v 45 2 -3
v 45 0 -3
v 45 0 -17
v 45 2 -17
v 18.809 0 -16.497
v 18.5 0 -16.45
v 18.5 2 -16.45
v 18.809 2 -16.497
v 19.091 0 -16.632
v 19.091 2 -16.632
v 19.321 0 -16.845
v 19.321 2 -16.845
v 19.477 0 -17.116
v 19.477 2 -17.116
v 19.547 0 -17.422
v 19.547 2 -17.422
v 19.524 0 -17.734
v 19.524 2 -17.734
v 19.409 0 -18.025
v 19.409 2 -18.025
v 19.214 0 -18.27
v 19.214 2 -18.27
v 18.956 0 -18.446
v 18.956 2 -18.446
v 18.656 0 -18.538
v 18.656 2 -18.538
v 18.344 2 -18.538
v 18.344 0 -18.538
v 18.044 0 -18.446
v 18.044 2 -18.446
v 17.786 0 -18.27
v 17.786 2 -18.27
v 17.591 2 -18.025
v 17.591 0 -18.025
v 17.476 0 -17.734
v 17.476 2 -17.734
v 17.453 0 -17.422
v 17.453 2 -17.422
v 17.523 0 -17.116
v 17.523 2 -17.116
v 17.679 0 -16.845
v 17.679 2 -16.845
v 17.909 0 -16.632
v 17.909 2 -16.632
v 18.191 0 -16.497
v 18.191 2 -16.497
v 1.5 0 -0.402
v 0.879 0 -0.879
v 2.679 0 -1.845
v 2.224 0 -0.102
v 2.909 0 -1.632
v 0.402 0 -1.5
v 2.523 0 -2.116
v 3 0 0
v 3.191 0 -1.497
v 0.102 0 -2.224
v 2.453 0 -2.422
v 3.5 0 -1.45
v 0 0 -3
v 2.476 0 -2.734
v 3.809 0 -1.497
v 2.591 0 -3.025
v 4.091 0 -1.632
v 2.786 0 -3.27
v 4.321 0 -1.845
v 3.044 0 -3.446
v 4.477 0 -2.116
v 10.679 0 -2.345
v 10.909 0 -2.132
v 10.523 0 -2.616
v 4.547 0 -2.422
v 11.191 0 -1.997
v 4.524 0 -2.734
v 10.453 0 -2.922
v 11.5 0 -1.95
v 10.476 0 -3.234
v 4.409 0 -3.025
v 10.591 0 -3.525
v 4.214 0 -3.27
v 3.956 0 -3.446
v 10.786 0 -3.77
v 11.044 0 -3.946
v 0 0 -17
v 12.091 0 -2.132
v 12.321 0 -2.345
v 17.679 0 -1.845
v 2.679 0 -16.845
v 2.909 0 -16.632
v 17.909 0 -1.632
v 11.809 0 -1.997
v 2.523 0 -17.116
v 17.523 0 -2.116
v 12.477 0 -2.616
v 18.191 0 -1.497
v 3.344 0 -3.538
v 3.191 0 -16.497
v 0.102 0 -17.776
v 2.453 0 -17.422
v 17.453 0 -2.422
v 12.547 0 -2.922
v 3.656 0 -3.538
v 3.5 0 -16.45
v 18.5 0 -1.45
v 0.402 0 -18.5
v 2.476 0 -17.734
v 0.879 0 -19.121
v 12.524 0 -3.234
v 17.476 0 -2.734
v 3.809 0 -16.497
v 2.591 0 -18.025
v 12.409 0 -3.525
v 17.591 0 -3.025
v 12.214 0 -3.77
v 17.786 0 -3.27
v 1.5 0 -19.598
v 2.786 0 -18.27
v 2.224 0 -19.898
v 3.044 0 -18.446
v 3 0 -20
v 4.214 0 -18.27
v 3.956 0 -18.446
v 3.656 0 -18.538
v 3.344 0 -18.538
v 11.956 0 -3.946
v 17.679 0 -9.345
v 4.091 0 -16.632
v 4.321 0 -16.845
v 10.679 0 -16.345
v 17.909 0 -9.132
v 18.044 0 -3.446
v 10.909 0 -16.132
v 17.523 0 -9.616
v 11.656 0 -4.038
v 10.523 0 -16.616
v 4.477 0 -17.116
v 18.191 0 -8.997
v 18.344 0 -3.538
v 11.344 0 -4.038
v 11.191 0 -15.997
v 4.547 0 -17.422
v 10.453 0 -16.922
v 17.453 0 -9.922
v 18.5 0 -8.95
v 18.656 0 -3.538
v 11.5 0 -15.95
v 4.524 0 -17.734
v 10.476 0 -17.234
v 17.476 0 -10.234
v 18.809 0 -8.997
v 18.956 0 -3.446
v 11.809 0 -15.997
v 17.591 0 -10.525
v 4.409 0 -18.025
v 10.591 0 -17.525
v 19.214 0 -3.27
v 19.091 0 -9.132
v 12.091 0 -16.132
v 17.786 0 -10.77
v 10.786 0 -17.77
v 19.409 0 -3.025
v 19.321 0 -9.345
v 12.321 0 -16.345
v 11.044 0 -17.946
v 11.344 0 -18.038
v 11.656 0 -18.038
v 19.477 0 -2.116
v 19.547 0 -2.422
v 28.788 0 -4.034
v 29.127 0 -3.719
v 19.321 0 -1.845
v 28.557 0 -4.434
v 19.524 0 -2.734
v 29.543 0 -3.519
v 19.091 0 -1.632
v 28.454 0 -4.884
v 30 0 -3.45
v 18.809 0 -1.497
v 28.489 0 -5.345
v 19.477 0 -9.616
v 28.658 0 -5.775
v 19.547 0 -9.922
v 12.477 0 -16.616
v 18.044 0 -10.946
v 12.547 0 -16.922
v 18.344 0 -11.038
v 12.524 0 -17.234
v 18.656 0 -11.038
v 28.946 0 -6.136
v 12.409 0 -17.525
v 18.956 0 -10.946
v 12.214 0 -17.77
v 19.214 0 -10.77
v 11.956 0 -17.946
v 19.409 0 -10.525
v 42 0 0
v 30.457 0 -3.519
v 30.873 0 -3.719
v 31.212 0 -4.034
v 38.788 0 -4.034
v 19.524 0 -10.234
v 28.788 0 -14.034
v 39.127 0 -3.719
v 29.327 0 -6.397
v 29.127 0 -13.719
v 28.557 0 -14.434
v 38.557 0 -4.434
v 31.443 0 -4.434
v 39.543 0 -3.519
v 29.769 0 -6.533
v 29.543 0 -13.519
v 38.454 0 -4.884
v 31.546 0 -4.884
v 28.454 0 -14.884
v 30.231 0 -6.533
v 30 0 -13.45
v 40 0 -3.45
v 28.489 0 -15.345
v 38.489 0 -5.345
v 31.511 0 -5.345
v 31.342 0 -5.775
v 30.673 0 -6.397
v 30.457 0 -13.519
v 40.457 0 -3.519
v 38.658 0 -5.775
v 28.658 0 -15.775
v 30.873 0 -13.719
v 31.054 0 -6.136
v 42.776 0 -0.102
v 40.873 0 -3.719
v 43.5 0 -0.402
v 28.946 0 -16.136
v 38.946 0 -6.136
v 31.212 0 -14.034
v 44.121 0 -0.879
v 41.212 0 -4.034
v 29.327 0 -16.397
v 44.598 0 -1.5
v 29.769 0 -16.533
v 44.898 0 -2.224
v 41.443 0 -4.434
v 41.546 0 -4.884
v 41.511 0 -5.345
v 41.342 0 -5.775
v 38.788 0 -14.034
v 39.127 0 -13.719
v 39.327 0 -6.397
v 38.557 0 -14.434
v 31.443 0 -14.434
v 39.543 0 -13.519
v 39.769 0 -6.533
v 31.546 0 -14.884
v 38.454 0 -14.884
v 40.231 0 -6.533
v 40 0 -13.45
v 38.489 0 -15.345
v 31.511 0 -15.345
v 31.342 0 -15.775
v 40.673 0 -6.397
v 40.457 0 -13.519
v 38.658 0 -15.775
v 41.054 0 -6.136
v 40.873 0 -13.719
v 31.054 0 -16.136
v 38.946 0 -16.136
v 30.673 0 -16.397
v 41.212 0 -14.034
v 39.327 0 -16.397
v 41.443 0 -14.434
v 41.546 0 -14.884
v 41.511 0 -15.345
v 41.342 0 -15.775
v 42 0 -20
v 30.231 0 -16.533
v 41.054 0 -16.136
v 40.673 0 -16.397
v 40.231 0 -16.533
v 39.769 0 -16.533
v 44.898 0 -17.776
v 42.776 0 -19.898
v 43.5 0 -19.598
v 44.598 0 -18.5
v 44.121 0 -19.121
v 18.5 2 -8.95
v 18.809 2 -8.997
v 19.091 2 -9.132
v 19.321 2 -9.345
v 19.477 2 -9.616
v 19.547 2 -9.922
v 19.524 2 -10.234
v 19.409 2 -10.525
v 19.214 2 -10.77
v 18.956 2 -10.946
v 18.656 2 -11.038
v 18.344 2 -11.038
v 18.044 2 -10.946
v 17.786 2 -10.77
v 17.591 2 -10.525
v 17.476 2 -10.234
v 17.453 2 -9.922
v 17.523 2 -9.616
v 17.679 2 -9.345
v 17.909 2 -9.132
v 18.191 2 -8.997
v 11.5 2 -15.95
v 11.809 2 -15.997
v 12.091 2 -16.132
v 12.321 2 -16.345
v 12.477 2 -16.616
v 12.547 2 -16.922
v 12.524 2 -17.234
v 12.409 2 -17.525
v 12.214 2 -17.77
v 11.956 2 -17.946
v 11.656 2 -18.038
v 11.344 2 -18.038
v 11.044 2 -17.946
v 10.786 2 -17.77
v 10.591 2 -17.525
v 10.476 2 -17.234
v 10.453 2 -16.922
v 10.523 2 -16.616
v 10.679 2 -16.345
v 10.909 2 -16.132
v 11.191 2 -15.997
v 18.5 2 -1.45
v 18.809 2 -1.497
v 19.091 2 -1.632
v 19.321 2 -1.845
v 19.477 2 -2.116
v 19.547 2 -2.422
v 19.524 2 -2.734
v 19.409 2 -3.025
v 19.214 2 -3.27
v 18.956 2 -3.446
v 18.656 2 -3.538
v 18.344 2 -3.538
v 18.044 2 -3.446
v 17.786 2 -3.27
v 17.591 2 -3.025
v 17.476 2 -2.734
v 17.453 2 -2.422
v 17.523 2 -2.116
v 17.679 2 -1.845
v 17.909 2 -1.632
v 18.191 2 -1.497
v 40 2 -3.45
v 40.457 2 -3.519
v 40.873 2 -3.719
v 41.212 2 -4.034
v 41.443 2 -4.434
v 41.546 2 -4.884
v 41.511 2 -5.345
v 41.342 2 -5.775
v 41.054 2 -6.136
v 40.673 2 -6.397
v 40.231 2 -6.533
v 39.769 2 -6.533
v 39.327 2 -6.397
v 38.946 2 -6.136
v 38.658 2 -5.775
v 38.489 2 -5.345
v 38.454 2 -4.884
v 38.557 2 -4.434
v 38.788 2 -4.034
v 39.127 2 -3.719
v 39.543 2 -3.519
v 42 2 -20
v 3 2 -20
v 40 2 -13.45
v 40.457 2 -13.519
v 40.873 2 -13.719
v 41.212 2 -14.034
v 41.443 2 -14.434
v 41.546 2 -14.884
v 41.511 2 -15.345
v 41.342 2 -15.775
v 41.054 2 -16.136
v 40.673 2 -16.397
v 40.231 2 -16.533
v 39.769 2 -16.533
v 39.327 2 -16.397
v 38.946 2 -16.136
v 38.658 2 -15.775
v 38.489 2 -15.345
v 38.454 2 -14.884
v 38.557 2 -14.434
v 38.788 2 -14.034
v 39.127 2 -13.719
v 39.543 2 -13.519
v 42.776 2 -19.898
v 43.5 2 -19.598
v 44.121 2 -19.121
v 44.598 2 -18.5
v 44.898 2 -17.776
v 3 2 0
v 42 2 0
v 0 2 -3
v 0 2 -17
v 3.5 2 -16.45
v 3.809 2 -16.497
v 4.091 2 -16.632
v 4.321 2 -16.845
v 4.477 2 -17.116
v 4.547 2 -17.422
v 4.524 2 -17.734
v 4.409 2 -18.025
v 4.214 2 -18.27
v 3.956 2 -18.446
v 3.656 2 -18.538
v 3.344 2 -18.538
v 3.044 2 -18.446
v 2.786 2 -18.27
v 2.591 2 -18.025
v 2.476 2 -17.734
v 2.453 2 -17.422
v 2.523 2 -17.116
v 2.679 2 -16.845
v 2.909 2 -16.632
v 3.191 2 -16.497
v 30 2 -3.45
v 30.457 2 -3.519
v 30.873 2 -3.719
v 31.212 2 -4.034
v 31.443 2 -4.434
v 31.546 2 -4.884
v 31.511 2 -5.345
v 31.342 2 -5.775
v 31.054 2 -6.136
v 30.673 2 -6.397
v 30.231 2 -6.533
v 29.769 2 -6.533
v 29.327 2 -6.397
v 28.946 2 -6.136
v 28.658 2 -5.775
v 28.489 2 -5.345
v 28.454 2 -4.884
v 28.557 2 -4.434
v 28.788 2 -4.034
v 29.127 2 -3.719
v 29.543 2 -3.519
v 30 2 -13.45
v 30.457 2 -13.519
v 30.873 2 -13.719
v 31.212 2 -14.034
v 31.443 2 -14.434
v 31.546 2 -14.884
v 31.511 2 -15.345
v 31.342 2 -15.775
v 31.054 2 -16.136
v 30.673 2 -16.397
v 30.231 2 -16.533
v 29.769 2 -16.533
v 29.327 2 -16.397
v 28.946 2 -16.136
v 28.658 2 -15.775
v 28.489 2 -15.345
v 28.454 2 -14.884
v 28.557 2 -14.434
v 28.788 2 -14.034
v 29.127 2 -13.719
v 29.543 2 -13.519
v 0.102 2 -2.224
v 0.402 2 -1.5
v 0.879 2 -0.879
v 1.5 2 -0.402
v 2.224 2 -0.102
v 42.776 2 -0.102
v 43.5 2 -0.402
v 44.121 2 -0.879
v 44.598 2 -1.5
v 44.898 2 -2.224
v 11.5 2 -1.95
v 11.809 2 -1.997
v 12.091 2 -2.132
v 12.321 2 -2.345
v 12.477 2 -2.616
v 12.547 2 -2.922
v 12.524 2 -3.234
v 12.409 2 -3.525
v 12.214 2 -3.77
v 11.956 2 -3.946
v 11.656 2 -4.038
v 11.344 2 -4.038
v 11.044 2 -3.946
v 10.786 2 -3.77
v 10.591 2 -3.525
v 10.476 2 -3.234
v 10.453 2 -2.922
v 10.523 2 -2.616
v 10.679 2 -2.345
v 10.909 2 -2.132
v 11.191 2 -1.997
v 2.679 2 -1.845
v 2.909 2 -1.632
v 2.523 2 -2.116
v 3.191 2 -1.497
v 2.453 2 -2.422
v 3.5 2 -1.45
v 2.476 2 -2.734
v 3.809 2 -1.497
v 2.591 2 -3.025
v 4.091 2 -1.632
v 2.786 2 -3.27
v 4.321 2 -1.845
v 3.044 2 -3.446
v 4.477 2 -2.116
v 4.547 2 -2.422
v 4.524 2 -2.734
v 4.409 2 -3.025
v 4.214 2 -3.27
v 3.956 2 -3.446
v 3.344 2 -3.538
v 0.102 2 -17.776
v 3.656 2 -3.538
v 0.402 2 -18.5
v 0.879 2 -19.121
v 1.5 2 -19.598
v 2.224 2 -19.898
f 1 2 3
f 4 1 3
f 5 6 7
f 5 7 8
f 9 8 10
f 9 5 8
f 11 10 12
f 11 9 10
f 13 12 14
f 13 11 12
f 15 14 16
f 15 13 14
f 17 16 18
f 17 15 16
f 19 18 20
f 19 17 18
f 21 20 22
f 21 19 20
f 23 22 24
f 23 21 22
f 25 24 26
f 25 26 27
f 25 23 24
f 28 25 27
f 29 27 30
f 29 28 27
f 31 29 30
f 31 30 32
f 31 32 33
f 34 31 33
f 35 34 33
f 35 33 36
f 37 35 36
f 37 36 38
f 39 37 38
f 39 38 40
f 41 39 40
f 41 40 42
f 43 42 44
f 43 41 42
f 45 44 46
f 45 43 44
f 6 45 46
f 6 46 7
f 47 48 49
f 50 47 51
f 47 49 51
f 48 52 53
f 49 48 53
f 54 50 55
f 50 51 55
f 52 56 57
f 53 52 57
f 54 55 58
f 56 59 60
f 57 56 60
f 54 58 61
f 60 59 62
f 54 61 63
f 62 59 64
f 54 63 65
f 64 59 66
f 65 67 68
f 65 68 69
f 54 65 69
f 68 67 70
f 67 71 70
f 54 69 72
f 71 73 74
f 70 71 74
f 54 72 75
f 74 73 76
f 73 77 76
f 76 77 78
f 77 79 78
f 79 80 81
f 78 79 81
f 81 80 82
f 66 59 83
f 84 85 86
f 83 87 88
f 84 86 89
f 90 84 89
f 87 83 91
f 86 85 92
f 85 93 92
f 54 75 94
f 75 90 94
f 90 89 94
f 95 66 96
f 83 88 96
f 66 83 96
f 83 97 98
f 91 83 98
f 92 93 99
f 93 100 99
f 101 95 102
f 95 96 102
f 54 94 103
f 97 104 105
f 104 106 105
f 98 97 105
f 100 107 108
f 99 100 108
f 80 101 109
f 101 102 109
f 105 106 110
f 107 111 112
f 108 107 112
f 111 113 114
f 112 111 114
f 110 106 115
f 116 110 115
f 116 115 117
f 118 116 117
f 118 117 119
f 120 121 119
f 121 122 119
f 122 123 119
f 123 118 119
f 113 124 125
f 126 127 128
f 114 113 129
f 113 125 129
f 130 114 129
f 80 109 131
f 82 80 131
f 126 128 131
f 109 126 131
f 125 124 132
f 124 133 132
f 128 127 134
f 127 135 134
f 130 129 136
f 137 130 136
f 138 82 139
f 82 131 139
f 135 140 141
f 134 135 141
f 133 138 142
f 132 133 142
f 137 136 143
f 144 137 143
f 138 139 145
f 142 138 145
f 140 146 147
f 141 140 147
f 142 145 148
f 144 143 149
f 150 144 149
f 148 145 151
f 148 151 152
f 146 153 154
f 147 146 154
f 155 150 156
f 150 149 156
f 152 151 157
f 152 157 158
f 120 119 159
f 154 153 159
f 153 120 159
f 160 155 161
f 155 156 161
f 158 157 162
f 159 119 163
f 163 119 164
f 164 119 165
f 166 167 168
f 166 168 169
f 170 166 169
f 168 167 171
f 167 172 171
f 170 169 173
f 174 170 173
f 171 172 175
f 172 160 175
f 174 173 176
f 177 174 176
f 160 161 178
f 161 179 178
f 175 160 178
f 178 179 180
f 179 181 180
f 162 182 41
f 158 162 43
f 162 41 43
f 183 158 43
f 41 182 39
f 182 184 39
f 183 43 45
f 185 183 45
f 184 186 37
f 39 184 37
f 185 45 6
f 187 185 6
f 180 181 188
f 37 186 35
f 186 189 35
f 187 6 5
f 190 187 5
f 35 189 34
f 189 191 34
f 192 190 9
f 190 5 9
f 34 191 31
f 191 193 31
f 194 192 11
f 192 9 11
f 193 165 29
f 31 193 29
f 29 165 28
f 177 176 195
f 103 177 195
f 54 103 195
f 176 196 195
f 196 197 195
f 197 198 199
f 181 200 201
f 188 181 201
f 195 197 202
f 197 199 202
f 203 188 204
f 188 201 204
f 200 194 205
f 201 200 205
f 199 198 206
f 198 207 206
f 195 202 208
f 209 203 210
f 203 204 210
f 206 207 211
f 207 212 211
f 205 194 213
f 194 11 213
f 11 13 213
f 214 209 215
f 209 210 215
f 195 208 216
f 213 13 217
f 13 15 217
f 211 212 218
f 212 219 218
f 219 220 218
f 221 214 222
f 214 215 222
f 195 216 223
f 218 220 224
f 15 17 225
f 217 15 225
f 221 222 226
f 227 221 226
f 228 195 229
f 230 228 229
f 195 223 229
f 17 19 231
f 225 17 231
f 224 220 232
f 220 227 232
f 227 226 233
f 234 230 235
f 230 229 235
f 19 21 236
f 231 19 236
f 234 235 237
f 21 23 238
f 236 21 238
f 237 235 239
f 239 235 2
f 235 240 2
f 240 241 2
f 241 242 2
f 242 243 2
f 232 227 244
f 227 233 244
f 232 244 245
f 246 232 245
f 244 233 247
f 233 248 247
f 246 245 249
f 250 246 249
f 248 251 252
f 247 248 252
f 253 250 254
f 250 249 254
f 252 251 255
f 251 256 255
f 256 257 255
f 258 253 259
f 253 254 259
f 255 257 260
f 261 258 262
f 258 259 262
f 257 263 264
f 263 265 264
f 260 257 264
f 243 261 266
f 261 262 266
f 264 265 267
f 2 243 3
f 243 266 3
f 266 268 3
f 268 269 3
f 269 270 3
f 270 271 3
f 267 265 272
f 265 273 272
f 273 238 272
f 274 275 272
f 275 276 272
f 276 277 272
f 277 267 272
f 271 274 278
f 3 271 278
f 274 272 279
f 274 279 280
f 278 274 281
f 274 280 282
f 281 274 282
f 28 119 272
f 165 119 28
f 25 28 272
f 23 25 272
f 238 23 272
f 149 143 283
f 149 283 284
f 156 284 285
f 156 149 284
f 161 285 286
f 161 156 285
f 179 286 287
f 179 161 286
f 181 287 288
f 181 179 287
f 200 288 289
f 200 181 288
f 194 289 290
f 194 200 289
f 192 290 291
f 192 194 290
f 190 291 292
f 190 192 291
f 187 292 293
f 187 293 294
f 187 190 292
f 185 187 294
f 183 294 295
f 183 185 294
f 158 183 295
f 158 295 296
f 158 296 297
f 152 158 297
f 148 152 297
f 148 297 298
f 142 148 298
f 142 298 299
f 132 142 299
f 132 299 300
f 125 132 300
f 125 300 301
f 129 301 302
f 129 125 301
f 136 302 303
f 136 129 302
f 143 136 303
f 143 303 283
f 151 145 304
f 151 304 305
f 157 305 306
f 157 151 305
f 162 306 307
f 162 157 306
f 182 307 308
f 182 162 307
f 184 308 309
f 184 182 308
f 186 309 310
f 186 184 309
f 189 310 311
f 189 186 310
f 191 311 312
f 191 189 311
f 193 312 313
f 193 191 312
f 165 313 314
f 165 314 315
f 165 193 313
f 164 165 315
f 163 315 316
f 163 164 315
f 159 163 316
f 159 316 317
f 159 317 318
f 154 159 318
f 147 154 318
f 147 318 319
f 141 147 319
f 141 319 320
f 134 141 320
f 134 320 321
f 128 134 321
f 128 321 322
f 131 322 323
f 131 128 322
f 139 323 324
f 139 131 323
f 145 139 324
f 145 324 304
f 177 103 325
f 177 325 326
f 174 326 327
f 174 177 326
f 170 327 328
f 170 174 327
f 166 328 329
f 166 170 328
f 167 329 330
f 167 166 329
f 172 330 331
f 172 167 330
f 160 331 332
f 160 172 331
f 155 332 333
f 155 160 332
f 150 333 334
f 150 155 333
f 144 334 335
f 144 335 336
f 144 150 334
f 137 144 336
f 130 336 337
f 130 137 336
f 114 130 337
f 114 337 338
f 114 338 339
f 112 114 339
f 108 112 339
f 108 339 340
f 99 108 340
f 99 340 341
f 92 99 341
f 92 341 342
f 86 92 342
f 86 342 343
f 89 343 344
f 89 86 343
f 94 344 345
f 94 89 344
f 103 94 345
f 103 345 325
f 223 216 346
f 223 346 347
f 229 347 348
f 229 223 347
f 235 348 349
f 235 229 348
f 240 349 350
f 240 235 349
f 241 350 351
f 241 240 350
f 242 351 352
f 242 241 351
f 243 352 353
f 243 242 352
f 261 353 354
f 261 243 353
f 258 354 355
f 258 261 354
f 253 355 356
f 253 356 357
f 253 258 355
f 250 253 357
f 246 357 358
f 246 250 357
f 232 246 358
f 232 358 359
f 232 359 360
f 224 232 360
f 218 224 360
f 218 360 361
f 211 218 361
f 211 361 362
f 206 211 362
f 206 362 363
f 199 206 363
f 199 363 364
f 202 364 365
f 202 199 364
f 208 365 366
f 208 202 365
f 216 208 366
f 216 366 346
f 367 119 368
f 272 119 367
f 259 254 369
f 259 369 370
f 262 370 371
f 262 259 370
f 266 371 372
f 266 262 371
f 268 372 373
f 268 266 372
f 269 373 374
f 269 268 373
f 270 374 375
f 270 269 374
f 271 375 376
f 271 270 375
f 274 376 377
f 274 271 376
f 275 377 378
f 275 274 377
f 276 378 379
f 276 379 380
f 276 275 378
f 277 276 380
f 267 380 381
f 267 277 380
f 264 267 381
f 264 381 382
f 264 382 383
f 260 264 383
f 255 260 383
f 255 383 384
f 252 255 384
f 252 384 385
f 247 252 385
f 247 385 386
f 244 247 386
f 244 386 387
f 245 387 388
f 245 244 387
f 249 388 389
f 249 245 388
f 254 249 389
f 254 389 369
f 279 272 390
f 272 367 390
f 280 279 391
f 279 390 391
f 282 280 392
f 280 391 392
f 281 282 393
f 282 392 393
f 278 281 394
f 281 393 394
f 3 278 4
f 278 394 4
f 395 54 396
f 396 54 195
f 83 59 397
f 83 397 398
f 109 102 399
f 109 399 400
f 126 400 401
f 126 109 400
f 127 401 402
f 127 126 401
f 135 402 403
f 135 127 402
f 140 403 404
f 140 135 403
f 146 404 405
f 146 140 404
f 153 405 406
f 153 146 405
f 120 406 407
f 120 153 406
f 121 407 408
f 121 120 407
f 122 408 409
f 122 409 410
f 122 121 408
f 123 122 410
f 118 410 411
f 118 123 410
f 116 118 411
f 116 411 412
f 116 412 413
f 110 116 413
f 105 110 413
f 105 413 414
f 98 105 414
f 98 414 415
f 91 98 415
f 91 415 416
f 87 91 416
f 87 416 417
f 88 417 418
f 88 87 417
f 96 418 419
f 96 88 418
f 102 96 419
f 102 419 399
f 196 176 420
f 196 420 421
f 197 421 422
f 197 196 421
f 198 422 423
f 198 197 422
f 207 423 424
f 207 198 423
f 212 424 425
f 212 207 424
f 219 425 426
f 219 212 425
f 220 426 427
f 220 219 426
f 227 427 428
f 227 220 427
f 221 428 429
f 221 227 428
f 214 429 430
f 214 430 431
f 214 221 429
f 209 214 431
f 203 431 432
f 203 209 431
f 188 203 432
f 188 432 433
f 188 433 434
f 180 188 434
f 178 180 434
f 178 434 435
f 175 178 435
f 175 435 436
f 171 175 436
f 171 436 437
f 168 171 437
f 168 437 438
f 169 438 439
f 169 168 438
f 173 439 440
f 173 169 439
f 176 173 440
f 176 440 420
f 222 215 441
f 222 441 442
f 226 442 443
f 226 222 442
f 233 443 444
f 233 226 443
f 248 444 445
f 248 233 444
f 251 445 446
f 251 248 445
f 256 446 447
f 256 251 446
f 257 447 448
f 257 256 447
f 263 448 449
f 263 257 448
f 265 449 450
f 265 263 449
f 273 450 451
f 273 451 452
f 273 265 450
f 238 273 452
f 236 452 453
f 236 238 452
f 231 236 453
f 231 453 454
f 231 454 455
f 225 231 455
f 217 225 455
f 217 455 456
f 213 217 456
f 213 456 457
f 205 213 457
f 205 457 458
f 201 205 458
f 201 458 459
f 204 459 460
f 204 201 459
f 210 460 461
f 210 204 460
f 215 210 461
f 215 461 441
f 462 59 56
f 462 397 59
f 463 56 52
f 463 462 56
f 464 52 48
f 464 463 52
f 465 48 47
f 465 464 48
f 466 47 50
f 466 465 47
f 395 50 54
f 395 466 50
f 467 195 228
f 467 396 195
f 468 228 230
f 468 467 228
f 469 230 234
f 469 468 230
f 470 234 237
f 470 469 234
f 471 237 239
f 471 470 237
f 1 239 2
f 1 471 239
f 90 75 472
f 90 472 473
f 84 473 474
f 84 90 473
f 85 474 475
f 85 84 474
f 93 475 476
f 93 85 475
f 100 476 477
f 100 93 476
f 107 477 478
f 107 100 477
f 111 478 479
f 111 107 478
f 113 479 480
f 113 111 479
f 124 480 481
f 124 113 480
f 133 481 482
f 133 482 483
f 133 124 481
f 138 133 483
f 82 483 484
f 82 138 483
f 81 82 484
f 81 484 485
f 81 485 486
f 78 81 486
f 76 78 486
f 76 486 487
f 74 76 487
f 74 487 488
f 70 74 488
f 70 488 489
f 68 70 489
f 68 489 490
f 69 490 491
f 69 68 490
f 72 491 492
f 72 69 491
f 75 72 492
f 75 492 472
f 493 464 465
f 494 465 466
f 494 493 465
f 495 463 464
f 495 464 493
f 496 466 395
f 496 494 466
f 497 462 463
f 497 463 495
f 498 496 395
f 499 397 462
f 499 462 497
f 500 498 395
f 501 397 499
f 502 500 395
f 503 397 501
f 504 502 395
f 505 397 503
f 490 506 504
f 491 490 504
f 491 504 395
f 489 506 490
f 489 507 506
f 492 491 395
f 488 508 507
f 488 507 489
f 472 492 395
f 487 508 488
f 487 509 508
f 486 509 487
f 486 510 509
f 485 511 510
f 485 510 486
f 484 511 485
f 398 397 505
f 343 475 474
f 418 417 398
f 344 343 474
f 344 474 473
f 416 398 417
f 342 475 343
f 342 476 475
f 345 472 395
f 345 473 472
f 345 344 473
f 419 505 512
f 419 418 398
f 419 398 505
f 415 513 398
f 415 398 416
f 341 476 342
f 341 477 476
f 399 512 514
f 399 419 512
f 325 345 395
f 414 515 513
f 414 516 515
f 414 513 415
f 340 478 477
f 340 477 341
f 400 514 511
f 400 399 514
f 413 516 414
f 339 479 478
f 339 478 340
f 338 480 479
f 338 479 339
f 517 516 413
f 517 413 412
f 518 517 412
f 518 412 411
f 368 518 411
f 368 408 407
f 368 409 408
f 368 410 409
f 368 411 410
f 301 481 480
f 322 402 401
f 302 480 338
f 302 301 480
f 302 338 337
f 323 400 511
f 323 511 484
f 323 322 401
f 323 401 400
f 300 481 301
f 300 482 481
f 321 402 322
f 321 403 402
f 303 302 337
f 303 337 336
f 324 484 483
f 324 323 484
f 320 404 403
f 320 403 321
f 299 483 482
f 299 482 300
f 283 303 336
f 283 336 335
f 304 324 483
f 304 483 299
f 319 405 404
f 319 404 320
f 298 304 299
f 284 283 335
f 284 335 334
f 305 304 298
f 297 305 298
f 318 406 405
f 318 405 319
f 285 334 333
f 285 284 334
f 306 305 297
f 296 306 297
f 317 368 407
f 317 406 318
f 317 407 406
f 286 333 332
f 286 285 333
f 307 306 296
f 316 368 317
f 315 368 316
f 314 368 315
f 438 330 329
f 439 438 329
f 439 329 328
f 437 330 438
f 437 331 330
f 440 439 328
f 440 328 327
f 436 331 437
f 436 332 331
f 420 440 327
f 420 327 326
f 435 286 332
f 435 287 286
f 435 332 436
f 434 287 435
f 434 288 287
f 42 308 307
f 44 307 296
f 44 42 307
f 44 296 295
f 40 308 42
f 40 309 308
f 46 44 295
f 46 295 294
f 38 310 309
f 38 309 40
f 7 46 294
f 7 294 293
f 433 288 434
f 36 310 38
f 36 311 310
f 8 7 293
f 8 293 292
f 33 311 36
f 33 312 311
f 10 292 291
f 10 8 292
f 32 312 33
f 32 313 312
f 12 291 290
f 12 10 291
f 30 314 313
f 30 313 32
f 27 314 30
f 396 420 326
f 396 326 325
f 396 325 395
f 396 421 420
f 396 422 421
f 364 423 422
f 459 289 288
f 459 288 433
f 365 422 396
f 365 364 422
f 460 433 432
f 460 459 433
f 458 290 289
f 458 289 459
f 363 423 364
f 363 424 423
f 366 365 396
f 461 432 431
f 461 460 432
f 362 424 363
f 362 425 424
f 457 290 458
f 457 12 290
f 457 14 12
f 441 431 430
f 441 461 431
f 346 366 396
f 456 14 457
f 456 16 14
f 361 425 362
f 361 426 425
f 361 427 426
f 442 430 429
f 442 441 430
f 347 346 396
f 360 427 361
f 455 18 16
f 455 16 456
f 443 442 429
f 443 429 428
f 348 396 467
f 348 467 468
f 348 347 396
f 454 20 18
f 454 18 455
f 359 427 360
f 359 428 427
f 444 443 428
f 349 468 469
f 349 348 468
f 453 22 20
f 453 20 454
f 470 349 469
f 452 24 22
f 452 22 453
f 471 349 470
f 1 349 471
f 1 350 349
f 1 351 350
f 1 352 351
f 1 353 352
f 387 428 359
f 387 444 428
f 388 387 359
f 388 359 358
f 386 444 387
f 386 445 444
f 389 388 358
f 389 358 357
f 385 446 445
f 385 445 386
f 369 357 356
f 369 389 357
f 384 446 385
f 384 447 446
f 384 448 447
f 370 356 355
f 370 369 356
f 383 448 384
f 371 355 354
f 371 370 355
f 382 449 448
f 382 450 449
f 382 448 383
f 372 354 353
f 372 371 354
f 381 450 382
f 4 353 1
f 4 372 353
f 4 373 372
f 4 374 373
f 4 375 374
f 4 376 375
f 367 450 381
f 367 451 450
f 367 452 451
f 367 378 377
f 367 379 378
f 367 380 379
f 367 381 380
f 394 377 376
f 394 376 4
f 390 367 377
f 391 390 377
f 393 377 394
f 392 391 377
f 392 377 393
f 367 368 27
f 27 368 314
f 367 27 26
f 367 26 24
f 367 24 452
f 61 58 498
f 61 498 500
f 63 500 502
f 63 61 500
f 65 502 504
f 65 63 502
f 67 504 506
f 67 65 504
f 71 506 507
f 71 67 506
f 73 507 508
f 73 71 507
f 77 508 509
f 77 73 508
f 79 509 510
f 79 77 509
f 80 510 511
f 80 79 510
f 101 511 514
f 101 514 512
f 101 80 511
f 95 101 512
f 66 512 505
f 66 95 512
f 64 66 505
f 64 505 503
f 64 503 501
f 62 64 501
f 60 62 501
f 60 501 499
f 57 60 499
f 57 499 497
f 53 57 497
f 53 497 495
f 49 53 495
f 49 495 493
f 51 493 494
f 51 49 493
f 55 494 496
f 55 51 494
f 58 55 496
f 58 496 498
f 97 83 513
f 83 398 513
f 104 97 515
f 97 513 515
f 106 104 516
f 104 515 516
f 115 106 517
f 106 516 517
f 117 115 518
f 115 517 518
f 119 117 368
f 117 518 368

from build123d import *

# Parameters (mm, degrees)
SKETCH_1_W      = 45
SKETCH_1_H      = 20
SKETCH_1_R      = 1.55
SKETCH_1_R_2    = 1.05
EXTRUDE_1_DEPTH = 2
FILLET_1_R      = 3


with BuildPart() as part:
    # 草图1 → 凸台-拉伸1 (new body)
    with BuildSketch(Plane(origin=(0, 0, 0), x_dir=(1, 0, 0), z_dir=(0, 1, 0))):
        with Locations((22.5, 10)):
            Rectangle(SKETCH_1_W, SKETCH_1_H)
        with Locations(Location((30, 15, 0), (0, 0, 270))):
            Circle(SKETCH_1_R, mode=Mode.SUBTRACT)
        with Locations(Location((40, 15, 0), (0, 0, 270))):
            Circle(SKETCH_1_R, mode=Mode.SUBTRACT)
        with Locations(Location((40, 5, 0), (0, 0, 270))):
            Circle(SKETCH_1_R, mode=Mode.SUBTRACT)
        with Locations(Location((30, 5, 0), (0, 0, 270))):
            Circle(SKETCH_1_R, mode=Mode.SUBTRACT)
        with Locations(Location((11.5, 17, 0), (0, 0, 270))):
            Circle(SKETCH_1_R_2, mode=Mode.SUBTRACT)
        with Locations(Location((18.5, 10, 0), (0, 0, 270))):
            Circle(SKETCH_1_R_2, mode=Mode.SUBTRACT)
        with Locations(Location((11.5, 3, 0), (0, 0, 270))):
            Circle(SKETCH_1_R_2, mode=Mode.SUBTRACT)
        with Locations(Location((3.5, 17.5, 0), (0, 0, 270))):
            Circle(SKETCH_1_R_2, mode=Mode.SUBTRACT)
        with Locations(Location((18.5, 17.5, 0), (0, 0, 270))):
            Circle(SKETCH_1_R_2, mode=Mode.SUBTRACT)
        with Locations(Location((18.5, 2.5, 0), (0, 0, 270))):
            Circle(SKETCH_1_R_2, mode=Mode.SUBTRACT)
        with Locations(Location((3.5, 2.5, 0), (0, 0, 270))):
            Circle(SKETCH_1_R_2, mode=Mode.SUBTRACT)
    extrude(amount=EXTRUDE_1_DEPTH)

    # 圆角1
    fillet_1_edges = [part.edges().sort_by_distance(p)[0] for p in [
        (0, 1, -20),
        (45, 1, -20),
        (45, 1, 0),
        (0, 1, 0),
    ]]
    fillet(fillet_1_edges, radius=FILLET_1_R)


solid = part.part
